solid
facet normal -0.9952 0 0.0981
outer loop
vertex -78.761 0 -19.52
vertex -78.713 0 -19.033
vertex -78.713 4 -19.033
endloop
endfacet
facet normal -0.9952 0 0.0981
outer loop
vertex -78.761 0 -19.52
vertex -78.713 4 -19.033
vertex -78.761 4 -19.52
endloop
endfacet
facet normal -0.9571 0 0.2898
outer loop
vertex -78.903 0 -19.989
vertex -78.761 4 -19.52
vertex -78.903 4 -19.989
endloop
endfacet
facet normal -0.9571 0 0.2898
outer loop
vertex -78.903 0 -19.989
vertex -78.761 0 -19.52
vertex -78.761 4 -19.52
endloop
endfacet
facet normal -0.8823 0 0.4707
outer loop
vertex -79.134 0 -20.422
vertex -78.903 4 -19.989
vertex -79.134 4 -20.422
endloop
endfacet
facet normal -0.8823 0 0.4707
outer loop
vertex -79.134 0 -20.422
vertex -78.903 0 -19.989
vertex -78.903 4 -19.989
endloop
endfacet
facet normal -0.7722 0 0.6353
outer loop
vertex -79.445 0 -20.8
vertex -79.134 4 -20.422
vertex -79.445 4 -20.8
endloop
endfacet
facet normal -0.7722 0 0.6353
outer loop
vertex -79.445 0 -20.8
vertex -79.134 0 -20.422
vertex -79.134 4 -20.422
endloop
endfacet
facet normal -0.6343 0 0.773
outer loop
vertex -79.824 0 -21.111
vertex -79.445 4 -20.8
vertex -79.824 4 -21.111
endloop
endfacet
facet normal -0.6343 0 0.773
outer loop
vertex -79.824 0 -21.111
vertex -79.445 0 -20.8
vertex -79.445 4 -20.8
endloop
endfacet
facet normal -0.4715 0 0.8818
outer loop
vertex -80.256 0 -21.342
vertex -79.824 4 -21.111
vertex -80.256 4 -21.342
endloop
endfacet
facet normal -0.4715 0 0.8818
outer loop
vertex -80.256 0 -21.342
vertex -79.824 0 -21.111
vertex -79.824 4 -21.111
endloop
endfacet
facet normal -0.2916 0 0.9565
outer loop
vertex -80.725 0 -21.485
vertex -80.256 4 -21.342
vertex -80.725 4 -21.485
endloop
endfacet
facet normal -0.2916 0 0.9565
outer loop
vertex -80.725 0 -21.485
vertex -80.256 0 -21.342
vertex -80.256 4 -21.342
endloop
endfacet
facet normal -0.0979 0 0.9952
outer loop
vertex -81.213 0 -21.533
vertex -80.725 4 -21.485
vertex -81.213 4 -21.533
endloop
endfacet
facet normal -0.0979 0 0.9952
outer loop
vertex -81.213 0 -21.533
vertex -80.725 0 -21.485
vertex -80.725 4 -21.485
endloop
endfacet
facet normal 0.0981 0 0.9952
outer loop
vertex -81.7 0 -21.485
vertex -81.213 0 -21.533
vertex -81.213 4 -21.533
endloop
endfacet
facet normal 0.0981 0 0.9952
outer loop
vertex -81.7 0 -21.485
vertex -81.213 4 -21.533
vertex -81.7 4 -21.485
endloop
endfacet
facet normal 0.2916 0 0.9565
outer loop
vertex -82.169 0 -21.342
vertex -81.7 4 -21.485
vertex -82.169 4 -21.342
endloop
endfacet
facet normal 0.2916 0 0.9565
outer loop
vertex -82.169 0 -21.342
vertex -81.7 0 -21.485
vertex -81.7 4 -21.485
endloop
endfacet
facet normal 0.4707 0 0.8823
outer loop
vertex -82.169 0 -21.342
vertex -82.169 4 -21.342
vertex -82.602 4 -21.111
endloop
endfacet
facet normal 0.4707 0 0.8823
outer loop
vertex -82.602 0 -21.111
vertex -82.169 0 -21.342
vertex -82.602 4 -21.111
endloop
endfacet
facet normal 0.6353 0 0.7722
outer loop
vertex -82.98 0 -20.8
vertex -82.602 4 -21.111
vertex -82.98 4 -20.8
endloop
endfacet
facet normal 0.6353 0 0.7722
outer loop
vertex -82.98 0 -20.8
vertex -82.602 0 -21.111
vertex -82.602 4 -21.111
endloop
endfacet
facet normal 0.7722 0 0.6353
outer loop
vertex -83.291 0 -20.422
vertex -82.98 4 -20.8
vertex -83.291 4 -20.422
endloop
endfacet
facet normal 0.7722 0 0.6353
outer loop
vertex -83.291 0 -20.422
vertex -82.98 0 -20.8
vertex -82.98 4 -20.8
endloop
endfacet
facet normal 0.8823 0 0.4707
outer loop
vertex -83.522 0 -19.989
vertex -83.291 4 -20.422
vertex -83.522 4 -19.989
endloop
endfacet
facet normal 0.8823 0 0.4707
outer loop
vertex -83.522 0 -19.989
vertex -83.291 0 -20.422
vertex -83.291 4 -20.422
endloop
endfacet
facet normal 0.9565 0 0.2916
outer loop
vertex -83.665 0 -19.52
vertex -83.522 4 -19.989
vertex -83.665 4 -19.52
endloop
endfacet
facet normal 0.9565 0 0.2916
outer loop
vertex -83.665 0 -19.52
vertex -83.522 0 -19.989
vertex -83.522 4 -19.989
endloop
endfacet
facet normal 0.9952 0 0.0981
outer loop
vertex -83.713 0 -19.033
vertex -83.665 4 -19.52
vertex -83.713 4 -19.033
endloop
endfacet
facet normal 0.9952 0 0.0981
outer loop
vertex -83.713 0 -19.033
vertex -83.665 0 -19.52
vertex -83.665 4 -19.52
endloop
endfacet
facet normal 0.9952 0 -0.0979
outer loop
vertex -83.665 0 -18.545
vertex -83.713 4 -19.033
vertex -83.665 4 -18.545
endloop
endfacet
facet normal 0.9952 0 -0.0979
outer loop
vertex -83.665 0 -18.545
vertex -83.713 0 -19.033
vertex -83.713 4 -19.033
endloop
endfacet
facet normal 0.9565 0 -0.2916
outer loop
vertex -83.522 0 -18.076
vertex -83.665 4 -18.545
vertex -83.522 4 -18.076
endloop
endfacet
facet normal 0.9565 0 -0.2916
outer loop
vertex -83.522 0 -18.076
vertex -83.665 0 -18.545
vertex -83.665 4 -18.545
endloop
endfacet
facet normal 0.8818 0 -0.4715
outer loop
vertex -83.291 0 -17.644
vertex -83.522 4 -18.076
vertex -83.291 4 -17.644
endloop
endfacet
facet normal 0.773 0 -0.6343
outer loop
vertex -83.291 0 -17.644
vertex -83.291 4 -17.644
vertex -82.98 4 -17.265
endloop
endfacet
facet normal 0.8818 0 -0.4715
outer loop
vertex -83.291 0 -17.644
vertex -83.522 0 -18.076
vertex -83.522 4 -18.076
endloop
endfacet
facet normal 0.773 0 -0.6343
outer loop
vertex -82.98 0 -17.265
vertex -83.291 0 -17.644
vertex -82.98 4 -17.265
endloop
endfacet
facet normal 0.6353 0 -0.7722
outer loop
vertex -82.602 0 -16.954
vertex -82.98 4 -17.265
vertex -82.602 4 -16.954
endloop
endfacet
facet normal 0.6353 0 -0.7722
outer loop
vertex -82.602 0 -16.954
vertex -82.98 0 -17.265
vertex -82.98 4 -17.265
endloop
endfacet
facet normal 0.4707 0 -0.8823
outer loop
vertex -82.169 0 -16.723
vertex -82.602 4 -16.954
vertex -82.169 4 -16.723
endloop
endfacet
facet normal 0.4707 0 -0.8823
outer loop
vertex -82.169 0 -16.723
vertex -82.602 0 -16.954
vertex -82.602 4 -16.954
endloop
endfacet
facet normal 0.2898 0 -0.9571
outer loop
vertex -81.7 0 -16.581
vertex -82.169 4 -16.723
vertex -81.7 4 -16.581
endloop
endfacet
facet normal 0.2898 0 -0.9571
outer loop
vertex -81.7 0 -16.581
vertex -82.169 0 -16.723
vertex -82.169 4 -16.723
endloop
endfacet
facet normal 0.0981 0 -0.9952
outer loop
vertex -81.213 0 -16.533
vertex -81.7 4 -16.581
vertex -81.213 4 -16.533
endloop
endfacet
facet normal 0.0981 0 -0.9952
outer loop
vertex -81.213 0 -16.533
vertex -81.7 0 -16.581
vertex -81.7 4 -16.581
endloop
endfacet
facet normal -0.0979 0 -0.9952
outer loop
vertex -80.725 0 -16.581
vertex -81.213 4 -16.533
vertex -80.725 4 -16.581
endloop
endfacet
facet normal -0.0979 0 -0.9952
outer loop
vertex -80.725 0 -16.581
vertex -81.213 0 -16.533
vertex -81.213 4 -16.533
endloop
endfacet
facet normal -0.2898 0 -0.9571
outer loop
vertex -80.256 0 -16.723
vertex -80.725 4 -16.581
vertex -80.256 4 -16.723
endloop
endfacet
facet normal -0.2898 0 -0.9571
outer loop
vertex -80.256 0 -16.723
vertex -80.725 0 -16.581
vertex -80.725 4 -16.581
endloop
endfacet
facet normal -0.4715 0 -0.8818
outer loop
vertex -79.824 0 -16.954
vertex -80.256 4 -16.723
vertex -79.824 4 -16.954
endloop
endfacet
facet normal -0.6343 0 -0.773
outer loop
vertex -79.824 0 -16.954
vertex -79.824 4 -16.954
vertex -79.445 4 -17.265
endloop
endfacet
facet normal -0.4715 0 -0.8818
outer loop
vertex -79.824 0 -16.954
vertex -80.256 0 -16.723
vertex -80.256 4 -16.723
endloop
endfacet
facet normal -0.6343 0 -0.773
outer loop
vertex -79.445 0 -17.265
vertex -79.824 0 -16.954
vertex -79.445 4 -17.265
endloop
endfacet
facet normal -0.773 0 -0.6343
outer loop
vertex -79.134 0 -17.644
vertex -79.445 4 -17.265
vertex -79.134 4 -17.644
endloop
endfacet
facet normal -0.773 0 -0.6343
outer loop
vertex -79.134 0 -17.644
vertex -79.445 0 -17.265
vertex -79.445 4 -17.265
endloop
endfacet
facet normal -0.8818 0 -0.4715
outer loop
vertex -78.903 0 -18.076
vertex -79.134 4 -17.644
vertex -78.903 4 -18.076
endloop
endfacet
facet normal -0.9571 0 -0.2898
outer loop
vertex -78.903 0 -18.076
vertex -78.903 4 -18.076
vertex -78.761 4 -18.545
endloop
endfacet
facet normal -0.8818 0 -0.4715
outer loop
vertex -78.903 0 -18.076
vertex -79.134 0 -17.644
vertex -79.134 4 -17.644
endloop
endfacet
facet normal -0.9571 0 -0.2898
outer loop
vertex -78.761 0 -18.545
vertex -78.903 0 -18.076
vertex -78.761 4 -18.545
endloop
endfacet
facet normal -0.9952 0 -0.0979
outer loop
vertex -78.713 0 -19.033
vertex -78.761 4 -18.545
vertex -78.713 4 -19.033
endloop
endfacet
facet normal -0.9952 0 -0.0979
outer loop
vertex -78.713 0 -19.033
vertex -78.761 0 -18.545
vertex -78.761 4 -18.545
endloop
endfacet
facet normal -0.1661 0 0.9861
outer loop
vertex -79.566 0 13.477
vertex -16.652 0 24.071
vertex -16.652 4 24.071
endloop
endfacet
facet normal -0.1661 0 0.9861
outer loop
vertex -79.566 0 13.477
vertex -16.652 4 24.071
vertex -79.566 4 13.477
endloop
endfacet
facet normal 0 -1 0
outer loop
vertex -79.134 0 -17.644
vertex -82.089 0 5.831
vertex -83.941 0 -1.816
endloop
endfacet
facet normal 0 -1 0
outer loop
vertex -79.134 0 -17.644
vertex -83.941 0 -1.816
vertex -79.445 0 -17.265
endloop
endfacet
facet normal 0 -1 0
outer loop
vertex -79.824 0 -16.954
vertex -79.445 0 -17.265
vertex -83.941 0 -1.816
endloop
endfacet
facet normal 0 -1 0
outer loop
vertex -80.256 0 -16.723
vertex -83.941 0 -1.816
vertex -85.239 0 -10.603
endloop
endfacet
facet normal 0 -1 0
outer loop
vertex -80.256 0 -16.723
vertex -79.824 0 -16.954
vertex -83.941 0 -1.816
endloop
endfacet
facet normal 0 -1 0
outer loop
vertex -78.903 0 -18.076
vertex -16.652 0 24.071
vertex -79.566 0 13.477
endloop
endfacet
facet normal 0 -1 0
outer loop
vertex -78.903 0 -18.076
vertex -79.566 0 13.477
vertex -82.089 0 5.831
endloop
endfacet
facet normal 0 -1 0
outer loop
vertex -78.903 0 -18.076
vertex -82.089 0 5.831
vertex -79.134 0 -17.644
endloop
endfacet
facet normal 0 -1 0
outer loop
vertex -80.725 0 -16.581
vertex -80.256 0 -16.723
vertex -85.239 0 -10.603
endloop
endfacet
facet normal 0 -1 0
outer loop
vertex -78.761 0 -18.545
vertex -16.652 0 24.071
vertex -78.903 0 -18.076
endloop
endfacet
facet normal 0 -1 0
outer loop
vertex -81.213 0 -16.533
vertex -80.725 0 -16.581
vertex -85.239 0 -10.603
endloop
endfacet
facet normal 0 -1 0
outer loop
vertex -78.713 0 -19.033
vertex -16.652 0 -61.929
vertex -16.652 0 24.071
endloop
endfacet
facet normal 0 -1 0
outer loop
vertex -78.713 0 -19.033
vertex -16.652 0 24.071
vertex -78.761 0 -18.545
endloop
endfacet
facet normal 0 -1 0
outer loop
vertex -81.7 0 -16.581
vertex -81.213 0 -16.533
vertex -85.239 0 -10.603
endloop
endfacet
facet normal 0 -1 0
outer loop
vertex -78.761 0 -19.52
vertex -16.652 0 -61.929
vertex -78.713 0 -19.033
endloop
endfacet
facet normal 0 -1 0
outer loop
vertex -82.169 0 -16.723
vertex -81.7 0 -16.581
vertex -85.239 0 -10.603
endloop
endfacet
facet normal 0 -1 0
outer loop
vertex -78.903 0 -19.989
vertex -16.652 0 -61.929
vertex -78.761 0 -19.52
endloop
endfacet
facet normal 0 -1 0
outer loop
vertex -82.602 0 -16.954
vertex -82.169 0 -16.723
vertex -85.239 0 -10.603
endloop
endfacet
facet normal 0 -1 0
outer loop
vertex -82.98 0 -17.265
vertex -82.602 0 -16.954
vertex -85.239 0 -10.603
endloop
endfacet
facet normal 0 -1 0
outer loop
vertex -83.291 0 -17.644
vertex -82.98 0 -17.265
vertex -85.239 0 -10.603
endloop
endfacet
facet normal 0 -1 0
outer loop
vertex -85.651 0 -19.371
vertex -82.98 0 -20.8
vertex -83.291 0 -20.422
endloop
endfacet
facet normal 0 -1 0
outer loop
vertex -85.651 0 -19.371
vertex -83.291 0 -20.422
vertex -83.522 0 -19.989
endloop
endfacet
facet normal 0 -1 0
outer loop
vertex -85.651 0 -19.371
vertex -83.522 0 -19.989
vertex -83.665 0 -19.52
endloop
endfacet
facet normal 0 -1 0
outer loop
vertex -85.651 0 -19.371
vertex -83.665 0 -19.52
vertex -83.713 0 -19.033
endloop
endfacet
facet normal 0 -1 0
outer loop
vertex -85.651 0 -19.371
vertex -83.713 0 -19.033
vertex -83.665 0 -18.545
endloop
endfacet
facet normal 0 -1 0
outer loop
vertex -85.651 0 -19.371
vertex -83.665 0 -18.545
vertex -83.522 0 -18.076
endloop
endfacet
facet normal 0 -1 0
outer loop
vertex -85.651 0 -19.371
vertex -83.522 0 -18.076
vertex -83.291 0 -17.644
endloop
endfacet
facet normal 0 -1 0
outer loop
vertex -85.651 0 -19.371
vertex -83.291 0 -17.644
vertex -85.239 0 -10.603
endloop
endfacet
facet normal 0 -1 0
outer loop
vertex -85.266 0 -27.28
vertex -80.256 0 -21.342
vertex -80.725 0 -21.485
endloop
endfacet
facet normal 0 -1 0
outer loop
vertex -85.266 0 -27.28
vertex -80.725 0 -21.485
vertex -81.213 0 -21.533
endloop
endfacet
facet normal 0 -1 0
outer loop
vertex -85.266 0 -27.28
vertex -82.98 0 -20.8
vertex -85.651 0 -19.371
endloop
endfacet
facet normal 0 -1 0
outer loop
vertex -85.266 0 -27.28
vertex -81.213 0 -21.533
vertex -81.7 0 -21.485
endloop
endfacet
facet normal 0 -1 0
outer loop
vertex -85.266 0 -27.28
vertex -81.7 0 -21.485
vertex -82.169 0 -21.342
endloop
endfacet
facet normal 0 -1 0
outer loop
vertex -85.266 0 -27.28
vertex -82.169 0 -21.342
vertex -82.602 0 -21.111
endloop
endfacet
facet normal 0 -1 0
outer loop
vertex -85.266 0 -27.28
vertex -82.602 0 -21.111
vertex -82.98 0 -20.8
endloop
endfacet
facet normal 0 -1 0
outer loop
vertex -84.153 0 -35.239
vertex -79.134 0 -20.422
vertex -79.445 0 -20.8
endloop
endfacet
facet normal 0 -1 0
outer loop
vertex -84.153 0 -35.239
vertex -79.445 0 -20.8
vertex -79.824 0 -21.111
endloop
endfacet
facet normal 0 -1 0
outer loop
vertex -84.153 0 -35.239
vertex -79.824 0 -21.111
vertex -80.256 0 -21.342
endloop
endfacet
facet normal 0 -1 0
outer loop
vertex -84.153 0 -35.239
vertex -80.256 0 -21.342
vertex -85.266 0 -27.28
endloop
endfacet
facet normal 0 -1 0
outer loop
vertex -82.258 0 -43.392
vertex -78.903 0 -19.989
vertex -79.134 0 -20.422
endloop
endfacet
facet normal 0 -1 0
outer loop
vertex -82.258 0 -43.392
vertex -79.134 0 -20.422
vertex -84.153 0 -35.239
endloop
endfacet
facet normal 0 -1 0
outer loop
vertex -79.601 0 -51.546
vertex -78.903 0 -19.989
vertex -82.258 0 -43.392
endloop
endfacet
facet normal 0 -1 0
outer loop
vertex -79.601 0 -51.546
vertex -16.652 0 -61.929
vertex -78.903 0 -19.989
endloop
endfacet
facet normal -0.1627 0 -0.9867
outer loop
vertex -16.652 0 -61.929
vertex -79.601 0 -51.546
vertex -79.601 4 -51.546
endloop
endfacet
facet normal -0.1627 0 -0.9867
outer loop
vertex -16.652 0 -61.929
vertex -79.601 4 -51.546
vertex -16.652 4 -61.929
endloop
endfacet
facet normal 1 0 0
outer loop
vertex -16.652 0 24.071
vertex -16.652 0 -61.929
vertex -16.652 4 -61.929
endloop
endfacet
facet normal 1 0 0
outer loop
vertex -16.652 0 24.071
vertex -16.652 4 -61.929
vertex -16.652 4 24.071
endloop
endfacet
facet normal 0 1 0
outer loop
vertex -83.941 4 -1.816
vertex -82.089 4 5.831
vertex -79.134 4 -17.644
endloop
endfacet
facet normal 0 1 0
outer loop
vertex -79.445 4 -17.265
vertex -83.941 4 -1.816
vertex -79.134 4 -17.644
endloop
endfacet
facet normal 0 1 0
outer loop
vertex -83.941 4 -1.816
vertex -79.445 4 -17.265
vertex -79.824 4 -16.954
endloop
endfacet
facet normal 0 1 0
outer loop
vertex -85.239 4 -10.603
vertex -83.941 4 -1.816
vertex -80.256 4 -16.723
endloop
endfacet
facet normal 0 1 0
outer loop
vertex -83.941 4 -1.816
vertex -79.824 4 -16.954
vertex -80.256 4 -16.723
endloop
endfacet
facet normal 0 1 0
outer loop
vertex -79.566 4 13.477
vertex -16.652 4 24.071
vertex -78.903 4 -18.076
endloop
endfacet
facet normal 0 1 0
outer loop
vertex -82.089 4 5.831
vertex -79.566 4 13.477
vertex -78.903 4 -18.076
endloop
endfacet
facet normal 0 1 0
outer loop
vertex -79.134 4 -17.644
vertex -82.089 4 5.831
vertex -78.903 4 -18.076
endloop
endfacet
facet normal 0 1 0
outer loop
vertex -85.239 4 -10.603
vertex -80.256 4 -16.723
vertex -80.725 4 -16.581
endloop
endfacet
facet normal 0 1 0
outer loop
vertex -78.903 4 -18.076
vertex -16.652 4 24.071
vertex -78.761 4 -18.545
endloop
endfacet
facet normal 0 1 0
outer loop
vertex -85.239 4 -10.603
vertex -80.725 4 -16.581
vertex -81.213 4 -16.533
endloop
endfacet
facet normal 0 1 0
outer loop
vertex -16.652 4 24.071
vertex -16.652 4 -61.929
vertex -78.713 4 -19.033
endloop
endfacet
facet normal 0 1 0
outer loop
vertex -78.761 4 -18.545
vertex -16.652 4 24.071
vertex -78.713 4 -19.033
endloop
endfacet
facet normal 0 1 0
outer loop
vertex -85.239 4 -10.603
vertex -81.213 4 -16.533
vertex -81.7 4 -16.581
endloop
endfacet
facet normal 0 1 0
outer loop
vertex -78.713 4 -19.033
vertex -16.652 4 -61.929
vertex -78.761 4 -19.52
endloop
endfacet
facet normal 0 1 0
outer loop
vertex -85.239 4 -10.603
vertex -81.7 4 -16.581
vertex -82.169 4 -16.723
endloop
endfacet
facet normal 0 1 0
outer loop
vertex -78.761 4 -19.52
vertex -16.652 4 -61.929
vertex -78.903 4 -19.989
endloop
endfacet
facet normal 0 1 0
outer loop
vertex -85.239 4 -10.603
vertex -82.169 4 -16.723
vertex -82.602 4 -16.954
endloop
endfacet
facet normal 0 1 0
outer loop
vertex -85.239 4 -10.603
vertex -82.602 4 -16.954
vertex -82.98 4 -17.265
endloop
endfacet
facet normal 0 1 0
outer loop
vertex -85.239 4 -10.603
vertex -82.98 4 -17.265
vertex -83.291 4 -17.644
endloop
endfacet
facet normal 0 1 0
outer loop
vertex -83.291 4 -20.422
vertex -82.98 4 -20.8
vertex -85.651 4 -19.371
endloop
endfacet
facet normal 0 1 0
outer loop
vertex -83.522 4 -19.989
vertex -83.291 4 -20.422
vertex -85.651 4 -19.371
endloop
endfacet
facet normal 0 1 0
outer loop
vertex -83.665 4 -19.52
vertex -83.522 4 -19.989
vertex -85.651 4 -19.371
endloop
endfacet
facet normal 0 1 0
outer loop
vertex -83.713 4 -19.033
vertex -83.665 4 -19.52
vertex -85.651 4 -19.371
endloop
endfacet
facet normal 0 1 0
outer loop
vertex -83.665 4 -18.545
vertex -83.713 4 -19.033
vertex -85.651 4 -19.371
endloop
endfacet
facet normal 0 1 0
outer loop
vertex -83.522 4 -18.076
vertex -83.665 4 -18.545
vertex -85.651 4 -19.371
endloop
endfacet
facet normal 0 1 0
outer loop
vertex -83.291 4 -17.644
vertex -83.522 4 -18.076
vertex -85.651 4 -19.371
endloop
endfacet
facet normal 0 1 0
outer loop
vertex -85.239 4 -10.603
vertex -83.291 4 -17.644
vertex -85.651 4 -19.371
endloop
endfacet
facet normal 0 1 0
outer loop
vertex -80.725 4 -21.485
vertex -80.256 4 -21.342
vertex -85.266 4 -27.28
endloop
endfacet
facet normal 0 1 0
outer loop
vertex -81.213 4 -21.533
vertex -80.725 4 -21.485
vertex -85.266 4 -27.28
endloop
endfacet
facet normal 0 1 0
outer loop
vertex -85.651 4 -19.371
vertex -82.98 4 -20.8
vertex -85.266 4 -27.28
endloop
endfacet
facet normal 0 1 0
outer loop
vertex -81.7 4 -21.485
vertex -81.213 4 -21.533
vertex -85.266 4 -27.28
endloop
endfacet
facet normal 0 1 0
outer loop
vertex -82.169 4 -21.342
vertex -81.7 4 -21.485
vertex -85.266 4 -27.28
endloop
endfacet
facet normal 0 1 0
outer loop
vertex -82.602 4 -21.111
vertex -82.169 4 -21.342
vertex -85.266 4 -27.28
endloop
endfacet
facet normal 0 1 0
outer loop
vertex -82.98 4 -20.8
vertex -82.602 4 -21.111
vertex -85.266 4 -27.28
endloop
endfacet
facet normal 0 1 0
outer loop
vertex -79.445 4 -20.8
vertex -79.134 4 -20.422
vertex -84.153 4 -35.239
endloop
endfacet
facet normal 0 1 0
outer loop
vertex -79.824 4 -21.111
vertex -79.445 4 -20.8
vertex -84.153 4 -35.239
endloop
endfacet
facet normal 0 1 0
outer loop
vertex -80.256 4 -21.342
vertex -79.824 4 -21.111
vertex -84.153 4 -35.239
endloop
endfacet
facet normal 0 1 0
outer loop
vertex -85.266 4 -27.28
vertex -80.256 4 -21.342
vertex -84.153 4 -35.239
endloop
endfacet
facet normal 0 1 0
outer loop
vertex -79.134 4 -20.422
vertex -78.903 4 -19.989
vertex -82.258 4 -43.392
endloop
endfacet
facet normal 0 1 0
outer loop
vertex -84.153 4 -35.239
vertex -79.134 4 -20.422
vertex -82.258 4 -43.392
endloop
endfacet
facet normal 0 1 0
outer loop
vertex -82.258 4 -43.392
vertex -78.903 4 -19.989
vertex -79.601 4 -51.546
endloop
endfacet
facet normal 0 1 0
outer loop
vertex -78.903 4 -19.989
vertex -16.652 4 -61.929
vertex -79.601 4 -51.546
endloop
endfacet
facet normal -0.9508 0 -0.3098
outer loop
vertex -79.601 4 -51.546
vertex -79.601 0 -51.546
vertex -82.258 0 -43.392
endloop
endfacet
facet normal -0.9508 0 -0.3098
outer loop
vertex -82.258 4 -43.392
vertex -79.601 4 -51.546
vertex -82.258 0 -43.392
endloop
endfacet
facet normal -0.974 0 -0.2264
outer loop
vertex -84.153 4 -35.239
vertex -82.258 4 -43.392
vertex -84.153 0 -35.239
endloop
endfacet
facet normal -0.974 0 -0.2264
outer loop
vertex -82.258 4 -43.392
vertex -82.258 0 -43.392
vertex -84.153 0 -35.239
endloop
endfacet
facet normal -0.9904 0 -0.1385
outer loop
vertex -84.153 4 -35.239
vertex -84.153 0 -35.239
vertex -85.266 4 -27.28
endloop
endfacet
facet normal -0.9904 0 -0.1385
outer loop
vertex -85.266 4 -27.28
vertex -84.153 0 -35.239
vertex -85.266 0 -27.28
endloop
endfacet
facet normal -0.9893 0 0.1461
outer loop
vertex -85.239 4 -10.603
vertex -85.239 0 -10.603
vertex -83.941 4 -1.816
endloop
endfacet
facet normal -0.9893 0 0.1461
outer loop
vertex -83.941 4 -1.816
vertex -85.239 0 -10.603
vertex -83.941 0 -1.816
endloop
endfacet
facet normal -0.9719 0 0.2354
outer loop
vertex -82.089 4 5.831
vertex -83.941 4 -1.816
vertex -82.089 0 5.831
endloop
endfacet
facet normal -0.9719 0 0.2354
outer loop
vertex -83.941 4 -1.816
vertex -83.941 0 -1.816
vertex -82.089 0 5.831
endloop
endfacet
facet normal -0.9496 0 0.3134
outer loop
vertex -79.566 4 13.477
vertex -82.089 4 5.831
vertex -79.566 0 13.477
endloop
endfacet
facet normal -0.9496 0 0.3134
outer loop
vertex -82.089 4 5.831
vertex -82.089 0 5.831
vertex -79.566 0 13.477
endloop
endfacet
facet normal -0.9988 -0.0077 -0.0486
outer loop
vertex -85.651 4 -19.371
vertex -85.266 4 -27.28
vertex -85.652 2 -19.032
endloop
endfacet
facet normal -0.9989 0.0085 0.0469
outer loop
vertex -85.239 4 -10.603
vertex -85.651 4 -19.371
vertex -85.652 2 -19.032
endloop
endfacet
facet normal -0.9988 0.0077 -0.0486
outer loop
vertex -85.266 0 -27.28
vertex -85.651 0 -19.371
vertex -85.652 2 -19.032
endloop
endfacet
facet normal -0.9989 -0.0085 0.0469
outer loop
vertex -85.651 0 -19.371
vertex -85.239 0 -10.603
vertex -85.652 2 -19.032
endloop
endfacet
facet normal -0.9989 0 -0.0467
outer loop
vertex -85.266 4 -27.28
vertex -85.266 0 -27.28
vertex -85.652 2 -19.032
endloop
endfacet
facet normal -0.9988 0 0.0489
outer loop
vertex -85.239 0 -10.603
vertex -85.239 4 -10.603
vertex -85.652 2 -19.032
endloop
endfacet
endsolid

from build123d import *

# Parameters (mm, degrees)
CROQUIS2_R              = 2.5
SALIENTE_EXTRUIR1_DEPTH = 4


with BuildPart() as part:
    # Croquis2 → Saliente-Extruir1 (new body)
    with BuildSketch(Plane(origin=(0, 0, 0), x_dir=(1, 0, 0), z_dir=(0, 1, 0))):
        with BuildLine():
            Line((-79.601178676, 51.546233526), (-16.651724566, 61.929211291))
            Line((-16.651724566, 61.929211291), (-16.651724566, -24.070788709))
            Line((-16.651724566, -24.070788709), (-79.565967679, -13.476544348))
            add(Edge.make_bspline(
                [(-79.601178676, 51.546233526), (-91.719874733, 19.028313012), (-79.565967679, -13.476544348)],
                knots=[0, 0, 0, 1, 1, 1], degree=2))
        make_face()
        with Locations((-81.212594438, 19.032720929)):
            Circle(CROQUIS2_R, mode=Mode.SUBTRACT)
    extrude(amount=SALIENTE_EXTRUIR1_DEPTH)


solid = part.part
